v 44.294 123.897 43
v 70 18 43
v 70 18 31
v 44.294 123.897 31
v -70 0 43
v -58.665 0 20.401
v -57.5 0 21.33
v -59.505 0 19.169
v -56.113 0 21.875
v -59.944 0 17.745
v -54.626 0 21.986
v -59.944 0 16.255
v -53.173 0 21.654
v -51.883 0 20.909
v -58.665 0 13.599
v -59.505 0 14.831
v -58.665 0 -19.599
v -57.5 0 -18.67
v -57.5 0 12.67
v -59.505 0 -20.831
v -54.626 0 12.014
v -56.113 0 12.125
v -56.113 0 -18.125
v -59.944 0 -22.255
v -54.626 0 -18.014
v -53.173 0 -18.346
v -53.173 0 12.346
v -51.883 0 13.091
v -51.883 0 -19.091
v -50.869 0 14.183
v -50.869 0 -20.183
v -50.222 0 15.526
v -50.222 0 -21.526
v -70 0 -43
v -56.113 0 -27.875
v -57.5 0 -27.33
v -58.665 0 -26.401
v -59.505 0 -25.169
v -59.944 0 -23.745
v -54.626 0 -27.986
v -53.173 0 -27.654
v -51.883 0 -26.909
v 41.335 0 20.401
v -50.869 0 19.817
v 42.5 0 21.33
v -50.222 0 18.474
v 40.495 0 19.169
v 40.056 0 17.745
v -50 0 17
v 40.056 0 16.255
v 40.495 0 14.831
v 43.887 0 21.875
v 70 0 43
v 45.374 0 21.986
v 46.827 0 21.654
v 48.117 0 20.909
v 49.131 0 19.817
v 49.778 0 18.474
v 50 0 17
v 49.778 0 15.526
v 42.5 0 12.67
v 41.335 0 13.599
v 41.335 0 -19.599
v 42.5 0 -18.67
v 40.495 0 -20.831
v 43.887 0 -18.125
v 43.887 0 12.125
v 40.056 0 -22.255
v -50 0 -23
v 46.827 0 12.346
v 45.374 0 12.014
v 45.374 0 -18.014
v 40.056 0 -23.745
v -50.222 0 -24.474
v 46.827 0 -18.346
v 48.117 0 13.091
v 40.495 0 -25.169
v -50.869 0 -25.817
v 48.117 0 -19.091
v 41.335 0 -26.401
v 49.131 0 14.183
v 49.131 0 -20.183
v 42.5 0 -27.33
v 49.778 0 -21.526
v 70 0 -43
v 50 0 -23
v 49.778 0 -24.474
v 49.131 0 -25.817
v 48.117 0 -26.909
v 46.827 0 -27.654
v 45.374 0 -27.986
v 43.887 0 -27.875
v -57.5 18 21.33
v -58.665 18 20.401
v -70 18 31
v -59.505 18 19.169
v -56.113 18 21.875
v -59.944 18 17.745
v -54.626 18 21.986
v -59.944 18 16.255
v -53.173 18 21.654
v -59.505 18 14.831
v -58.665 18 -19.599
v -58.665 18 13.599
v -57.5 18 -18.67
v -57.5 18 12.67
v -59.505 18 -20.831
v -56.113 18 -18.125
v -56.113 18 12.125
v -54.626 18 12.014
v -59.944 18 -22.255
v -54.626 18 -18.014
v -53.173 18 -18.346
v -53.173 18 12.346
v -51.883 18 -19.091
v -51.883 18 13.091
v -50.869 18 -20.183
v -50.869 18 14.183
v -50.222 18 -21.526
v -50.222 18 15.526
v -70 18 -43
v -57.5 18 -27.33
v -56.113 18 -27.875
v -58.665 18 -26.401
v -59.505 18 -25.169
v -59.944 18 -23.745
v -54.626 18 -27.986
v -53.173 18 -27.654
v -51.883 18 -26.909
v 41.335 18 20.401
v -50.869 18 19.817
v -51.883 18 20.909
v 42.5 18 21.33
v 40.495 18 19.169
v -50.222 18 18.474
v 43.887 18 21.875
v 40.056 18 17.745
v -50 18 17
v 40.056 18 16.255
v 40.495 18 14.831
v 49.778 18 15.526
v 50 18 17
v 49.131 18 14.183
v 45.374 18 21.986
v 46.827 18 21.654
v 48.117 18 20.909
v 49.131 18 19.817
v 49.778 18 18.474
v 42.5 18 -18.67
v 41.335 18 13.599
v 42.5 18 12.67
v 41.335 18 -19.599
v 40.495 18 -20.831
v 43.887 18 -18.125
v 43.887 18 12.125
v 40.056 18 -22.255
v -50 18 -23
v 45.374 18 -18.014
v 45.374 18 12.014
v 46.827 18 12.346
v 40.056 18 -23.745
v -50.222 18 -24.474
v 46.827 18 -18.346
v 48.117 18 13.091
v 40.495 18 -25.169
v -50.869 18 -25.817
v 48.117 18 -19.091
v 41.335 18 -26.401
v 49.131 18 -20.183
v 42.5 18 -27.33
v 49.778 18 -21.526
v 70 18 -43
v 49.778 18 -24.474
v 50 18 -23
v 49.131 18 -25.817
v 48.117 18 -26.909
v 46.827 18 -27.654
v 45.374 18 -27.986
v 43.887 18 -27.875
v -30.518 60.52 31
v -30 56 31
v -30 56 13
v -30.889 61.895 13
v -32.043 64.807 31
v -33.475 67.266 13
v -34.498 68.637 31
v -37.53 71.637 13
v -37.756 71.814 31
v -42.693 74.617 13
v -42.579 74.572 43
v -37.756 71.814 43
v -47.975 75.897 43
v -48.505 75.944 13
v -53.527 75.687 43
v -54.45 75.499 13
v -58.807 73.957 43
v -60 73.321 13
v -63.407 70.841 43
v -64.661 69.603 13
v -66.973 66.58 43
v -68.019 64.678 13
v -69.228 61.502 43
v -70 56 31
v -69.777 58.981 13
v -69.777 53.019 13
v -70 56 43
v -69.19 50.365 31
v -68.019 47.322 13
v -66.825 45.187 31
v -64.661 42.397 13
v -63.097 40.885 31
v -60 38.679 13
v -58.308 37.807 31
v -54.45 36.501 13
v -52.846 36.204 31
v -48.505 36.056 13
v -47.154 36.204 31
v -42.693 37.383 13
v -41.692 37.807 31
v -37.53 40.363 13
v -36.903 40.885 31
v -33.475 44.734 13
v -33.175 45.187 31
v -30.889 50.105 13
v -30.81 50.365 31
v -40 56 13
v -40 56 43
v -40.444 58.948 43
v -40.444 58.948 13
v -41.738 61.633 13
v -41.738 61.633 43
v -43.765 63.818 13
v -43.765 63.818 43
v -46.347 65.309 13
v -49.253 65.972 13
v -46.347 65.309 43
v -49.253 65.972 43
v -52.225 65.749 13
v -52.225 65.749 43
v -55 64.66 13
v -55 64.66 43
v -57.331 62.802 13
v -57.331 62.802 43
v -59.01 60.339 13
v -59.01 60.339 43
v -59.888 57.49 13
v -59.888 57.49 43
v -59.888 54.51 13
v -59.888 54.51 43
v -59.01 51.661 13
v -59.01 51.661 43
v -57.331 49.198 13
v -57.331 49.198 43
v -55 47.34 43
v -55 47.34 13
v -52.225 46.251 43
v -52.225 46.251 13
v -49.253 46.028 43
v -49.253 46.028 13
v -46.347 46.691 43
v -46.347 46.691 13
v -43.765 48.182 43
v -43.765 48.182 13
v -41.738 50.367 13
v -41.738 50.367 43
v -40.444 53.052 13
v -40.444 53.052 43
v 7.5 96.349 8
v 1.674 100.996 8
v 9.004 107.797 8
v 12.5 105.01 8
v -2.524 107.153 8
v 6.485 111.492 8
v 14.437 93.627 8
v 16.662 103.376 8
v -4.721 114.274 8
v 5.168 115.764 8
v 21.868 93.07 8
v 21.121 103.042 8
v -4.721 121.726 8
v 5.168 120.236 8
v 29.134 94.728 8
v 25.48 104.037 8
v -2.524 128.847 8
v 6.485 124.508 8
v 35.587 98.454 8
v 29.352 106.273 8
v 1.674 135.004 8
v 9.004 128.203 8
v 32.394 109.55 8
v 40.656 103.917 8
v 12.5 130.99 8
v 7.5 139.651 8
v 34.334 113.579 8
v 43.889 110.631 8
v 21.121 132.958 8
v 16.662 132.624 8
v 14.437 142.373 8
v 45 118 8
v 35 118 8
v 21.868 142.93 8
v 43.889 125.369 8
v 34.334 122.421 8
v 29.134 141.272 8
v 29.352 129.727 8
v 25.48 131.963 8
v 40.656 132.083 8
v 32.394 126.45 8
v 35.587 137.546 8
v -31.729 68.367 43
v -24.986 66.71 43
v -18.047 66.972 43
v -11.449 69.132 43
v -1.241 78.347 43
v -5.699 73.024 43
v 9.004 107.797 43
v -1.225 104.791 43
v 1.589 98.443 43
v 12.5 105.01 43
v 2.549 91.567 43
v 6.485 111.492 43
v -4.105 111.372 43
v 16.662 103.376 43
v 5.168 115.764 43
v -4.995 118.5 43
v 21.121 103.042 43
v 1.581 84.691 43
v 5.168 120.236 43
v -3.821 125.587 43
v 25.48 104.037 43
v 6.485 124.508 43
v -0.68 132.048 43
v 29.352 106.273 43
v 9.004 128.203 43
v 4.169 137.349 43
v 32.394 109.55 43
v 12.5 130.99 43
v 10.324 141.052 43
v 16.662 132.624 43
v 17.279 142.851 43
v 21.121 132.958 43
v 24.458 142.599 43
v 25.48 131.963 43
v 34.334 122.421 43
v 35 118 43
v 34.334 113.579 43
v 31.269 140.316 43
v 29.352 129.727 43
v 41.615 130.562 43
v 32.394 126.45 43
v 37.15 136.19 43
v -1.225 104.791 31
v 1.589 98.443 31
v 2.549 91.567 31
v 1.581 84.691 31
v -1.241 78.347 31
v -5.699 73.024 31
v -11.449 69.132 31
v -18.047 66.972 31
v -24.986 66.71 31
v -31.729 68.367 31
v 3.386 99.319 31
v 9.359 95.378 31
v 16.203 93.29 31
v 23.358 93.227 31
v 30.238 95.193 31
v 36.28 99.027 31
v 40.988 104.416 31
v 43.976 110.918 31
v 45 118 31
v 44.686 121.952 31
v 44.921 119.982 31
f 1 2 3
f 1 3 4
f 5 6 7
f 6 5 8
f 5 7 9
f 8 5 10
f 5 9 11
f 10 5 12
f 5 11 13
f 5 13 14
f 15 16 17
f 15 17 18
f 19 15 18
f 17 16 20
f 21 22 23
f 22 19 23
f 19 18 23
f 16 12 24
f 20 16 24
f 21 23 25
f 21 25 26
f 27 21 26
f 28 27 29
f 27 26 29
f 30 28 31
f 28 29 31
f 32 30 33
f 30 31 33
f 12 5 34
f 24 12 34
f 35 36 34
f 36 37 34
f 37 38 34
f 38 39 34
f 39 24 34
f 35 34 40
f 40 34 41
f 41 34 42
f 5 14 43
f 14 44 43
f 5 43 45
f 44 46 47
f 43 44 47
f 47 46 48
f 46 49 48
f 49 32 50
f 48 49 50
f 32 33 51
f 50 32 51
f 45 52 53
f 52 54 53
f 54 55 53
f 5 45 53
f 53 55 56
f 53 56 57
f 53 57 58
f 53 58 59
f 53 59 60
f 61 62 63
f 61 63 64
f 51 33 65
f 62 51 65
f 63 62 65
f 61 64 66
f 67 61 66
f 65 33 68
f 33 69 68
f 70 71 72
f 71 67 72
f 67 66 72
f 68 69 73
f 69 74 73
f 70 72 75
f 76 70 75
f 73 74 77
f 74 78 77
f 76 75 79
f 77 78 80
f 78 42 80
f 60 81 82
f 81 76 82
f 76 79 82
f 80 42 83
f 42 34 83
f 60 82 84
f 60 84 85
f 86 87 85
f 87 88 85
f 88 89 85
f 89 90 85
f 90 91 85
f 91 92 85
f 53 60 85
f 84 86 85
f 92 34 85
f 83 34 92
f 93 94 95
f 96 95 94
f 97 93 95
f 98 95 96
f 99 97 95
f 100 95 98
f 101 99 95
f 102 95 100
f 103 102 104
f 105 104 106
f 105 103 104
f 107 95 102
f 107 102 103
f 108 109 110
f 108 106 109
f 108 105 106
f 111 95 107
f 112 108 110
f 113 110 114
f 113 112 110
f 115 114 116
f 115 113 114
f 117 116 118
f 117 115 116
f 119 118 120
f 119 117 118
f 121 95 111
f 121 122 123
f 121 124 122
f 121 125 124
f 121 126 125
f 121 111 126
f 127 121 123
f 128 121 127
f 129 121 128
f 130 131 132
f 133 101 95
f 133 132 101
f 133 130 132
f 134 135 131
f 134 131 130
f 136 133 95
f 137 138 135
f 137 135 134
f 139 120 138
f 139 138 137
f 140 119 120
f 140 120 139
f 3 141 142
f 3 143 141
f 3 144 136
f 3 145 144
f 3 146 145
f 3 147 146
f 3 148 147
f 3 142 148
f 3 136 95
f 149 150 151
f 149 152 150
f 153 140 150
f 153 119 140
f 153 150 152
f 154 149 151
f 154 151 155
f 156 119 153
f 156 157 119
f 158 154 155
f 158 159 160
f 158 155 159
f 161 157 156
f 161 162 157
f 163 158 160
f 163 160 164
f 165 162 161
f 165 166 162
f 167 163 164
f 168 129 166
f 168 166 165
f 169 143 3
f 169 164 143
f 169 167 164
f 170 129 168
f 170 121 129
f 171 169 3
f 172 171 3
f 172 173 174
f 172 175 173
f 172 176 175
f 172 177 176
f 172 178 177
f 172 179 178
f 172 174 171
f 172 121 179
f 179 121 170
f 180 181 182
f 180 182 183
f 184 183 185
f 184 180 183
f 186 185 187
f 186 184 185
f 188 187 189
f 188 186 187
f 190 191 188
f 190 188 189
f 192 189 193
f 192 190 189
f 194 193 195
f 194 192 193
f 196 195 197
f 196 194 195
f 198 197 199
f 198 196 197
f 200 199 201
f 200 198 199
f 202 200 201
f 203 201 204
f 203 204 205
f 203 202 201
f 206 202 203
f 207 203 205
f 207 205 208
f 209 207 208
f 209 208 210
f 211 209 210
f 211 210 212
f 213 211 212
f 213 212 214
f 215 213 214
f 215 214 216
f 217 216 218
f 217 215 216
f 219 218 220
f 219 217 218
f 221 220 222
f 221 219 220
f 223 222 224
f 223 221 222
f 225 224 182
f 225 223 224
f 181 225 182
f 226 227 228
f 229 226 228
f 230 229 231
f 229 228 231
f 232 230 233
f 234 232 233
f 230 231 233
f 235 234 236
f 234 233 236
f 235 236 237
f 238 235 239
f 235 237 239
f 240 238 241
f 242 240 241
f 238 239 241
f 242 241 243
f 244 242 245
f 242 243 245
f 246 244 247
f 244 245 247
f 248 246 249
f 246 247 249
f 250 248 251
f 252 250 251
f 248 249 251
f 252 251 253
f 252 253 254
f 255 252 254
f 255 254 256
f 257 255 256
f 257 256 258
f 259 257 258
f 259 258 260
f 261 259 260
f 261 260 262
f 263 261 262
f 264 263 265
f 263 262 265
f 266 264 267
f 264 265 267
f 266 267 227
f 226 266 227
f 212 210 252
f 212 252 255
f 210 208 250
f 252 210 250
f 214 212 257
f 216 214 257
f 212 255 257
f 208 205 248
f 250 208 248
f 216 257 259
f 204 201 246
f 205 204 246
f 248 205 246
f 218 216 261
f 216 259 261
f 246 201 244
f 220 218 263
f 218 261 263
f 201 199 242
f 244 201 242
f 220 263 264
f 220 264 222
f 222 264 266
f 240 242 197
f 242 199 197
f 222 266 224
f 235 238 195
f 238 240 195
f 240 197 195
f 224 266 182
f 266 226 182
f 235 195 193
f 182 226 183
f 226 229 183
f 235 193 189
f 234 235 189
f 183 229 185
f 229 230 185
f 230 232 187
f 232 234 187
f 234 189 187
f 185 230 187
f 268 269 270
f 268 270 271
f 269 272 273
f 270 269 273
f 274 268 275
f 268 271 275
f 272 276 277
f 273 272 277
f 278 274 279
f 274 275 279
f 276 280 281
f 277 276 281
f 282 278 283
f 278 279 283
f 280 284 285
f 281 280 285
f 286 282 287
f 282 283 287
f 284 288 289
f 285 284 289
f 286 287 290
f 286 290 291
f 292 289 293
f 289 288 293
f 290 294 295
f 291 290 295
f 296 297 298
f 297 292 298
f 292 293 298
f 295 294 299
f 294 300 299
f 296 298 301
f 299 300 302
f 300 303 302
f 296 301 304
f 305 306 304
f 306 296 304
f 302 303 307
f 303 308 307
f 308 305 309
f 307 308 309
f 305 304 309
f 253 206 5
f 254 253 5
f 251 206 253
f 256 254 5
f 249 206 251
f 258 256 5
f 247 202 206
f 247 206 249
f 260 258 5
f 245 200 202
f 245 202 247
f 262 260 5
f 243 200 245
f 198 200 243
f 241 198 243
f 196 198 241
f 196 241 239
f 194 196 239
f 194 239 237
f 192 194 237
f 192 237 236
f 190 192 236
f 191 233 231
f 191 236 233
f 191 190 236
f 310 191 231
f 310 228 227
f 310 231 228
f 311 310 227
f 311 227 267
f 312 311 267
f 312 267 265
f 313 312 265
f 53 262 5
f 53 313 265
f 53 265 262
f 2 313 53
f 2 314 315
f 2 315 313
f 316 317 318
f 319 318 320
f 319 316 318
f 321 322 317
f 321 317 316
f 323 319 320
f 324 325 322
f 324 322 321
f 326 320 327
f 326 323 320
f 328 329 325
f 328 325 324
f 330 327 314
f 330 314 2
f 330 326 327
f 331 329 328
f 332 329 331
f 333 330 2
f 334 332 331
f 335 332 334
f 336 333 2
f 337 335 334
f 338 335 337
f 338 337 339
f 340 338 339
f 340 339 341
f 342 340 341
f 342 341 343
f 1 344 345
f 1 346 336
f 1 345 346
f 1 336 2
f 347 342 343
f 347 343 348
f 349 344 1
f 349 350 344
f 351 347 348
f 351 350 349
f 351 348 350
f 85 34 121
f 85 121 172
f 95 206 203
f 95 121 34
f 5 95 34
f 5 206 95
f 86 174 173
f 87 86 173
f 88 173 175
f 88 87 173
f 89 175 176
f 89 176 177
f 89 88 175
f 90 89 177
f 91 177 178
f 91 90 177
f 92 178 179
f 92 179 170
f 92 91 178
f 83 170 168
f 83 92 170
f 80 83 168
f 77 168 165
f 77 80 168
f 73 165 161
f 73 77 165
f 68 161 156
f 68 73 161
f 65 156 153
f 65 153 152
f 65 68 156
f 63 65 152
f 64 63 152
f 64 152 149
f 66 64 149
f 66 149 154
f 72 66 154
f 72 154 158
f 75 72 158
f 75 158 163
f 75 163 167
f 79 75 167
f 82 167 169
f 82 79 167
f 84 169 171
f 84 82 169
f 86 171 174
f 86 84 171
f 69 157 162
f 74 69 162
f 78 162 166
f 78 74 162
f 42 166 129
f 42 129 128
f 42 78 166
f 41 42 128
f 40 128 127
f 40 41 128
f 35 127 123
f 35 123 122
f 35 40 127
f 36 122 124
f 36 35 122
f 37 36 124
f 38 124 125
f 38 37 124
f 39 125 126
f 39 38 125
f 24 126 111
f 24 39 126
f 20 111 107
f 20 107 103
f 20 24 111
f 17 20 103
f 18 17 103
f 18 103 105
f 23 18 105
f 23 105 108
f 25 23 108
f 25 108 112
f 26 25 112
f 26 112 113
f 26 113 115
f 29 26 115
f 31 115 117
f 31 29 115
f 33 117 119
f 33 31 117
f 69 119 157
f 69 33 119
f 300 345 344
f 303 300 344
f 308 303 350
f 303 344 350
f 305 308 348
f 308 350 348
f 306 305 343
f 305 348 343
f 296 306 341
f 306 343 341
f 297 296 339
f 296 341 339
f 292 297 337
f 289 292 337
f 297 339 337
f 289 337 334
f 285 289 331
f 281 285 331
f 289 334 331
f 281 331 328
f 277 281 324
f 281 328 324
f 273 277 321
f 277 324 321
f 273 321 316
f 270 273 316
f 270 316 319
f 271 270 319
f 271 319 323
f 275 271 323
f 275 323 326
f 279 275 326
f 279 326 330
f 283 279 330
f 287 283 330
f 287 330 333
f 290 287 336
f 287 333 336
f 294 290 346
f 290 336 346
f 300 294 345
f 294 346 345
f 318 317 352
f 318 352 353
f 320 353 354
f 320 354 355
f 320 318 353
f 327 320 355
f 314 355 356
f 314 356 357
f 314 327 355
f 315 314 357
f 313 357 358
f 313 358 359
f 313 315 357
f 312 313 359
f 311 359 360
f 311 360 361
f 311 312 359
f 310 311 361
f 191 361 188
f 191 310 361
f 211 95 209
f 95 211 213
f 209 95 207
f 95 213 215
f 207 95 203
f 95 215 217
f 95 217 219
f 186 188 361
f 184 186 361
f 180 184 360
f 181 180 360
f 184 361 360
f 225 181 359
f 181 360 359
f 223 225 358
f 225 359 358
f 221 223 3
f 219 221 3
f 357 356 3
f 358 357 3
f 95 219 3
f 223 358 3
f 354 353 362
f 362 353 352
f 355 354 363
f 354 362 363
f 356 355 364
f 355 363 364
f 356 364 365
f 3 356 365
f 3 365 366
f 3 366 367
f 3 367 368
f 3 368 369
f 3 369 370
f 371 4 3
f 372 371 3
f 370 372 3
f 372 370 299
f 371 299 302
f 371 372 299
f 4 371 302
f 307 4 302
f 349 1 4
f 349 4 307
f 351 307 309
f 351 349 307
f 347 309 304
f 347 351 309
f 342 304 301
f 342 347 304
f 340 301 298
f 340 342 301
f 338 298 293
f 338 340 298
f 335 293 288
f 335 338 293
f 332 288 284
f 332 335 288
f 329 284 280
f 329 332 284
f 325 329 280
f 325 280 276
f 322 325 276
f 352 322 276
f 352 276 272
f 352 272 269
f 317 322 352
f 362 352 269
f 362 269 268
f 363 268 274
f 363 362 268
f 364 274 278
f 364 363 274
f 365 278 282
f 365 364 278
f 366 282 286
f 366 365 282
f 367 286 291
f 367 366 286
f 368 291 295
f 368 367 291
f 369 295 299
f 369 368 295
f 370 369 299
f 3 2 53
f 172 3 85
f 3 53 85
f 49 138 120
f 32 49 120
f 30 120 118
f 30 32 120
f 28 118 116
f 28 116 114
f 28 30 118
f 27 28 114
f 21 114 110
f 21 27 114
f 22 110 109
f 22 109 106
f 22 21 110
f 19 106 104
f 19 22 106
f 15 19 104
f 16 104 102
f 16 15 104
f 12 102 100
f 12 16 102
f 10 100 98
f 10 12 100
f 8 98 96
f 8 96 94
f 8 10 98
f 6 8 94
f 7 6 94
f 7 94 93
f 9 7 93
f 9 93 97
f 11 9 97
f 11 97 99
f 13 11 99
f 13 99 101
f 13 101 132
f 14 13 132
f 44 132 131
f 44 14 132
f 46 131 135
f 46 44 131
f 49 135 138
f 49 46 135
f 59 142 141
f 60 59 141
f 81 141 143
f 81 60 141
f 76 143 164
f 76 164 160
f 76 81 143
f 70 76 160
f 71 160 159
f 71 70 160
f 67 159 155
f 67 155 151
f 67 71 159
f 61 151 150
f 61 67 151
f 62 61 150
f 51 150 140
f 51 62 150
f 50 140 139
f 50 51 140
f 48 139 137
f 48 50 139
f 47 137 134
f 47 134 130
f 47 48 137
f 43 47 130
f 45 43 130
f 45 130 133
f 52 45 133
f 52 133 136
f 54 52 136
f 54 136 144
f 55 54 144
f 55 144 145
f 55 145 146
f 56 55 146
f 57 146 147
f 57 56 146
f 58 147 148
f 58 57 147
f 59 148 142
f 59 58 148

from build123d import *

# Parameters (mm, degrees)
SKETCH1_W            = 140
SKETCH1_H            = 86
BOSS_EXTRUDE1_DEPTH  = 18
BOSS_EXTRUDE2_DEPTH  = 12
SKETCH2_4_R          = 25
SKETCH2_4_R_2        = 15
BOSS_EXTRUDE3_DEPTH  = 35
SKETCH2_6_R          = 20
SKETCH2_6_R_2        = 10
BOSS_EXTRUDE4_DEPTH  = 30
HOLE1_OUTLINE_R      = 5
HOLE1_DEPTH          = 18
LPATTERN1_COUNT      = 2
LPATTERN1_PITCH      = 100
LPATTERN1_COUNT_DIR2 = 2
LPATTERN1_PITCH_DIR2 = 40


# Read off the part's stored shape, not the designer's step: Hole1
with BuildPart() as part:
    # Sketch1 → Boss-Extrude1 (new body)
    with BuildSketch(Plane(origin=(0, 0, 0), x_dir=(1, 0, 0), z_dir=(0, 1, 0))):
        Rectangle(SKETCH1_W, SKETCH1_H)
    extrude(amount=BOSS_EXTRUDE1_DEPTH)

    # Sketch2 → Boss-Extrude2 (add)
    with BuildSketch(Plane.XY.offset(43)):
        with BuildLine():
            ThreePointArc((-30, 56), (-50, 36), (-70, 56))
            Line((-70, 56), (-70, 18))
            Line((-70, 18), (70, 18))
            Line((70, 18), (44.294494718, 123.897247359))
            ThreePointArc((44.294494718, 123.897247359), (44.822997079, 120.969649142), (45, 118))
            ThreePointArc((45, 118), (26.869042098, 93.962191018), (-1.225300853, 104.790662253))
            ThreePointArc((-1.225300853, 104.790662253), (-5.698641076, 73.02406676), (-37.75582298, 71.813922003))
            ThreePointArc((-37.75582298, 71.813922003), (-32.043336329, 64.80671504), (-30, 56))
        make_face()
    extrude(amount=-BOSS_EXTRUDE2_DEPTH)

    # Sketch2<4> → Boss-Extrude3 (add)
    with BuildSketch(Plane.XY.offset(43)):
        with Locations((20, 118)):
            Circle(SKETCH2_4_R)
        with Locations((20, 118)):
            Circle(SKETCH2_4_R_2, mode=Mode.SUBTRACT)
    extrude(amount=-BOSS_EXTRUDE3_DEPTH)

    # Sketch2<6> → Boss-Extrude4 (add)
    with BuildSketch(Plane.XY.offset(43)):
        with Locations((-50, 56)):
            Circle(SKETCH2_6_R)
        with Locations((-50, 56)):
            Circle(SKETCH2_6_R_2, mode=Mode.SUBTRACT)
    extrude(amount=-BOSS_EXTRUDE4_DEPTH)

    # Hole1 outline → Hole1 (cut)
    with BuildSketch(Plane(origin=(0, 0, 0), x_dir=(1, 0, 0), z_dir=(0, 1, 0))):
        with Locations((-55, 23)):
            Circle(HOLE1_OUTLINE_R)
    hole1 = extrude(amount=HOLE1_DEPTH, mode=Mode.SUBTRACT)

    # LPattern1: Hole1 2 × 2
    with Locations(*[(i * LPATTERN1_PITCH, 0, j * LPATTERN1_PITCH_DIR2) for i in range(LPATTERN1_COUNT) for j in range(LPATTERN1_COUNT_DIR2) if (i, j) != (0, 0)]):
        add(hole1, mode=Mode.SUBTRACT)


solid = part.part
